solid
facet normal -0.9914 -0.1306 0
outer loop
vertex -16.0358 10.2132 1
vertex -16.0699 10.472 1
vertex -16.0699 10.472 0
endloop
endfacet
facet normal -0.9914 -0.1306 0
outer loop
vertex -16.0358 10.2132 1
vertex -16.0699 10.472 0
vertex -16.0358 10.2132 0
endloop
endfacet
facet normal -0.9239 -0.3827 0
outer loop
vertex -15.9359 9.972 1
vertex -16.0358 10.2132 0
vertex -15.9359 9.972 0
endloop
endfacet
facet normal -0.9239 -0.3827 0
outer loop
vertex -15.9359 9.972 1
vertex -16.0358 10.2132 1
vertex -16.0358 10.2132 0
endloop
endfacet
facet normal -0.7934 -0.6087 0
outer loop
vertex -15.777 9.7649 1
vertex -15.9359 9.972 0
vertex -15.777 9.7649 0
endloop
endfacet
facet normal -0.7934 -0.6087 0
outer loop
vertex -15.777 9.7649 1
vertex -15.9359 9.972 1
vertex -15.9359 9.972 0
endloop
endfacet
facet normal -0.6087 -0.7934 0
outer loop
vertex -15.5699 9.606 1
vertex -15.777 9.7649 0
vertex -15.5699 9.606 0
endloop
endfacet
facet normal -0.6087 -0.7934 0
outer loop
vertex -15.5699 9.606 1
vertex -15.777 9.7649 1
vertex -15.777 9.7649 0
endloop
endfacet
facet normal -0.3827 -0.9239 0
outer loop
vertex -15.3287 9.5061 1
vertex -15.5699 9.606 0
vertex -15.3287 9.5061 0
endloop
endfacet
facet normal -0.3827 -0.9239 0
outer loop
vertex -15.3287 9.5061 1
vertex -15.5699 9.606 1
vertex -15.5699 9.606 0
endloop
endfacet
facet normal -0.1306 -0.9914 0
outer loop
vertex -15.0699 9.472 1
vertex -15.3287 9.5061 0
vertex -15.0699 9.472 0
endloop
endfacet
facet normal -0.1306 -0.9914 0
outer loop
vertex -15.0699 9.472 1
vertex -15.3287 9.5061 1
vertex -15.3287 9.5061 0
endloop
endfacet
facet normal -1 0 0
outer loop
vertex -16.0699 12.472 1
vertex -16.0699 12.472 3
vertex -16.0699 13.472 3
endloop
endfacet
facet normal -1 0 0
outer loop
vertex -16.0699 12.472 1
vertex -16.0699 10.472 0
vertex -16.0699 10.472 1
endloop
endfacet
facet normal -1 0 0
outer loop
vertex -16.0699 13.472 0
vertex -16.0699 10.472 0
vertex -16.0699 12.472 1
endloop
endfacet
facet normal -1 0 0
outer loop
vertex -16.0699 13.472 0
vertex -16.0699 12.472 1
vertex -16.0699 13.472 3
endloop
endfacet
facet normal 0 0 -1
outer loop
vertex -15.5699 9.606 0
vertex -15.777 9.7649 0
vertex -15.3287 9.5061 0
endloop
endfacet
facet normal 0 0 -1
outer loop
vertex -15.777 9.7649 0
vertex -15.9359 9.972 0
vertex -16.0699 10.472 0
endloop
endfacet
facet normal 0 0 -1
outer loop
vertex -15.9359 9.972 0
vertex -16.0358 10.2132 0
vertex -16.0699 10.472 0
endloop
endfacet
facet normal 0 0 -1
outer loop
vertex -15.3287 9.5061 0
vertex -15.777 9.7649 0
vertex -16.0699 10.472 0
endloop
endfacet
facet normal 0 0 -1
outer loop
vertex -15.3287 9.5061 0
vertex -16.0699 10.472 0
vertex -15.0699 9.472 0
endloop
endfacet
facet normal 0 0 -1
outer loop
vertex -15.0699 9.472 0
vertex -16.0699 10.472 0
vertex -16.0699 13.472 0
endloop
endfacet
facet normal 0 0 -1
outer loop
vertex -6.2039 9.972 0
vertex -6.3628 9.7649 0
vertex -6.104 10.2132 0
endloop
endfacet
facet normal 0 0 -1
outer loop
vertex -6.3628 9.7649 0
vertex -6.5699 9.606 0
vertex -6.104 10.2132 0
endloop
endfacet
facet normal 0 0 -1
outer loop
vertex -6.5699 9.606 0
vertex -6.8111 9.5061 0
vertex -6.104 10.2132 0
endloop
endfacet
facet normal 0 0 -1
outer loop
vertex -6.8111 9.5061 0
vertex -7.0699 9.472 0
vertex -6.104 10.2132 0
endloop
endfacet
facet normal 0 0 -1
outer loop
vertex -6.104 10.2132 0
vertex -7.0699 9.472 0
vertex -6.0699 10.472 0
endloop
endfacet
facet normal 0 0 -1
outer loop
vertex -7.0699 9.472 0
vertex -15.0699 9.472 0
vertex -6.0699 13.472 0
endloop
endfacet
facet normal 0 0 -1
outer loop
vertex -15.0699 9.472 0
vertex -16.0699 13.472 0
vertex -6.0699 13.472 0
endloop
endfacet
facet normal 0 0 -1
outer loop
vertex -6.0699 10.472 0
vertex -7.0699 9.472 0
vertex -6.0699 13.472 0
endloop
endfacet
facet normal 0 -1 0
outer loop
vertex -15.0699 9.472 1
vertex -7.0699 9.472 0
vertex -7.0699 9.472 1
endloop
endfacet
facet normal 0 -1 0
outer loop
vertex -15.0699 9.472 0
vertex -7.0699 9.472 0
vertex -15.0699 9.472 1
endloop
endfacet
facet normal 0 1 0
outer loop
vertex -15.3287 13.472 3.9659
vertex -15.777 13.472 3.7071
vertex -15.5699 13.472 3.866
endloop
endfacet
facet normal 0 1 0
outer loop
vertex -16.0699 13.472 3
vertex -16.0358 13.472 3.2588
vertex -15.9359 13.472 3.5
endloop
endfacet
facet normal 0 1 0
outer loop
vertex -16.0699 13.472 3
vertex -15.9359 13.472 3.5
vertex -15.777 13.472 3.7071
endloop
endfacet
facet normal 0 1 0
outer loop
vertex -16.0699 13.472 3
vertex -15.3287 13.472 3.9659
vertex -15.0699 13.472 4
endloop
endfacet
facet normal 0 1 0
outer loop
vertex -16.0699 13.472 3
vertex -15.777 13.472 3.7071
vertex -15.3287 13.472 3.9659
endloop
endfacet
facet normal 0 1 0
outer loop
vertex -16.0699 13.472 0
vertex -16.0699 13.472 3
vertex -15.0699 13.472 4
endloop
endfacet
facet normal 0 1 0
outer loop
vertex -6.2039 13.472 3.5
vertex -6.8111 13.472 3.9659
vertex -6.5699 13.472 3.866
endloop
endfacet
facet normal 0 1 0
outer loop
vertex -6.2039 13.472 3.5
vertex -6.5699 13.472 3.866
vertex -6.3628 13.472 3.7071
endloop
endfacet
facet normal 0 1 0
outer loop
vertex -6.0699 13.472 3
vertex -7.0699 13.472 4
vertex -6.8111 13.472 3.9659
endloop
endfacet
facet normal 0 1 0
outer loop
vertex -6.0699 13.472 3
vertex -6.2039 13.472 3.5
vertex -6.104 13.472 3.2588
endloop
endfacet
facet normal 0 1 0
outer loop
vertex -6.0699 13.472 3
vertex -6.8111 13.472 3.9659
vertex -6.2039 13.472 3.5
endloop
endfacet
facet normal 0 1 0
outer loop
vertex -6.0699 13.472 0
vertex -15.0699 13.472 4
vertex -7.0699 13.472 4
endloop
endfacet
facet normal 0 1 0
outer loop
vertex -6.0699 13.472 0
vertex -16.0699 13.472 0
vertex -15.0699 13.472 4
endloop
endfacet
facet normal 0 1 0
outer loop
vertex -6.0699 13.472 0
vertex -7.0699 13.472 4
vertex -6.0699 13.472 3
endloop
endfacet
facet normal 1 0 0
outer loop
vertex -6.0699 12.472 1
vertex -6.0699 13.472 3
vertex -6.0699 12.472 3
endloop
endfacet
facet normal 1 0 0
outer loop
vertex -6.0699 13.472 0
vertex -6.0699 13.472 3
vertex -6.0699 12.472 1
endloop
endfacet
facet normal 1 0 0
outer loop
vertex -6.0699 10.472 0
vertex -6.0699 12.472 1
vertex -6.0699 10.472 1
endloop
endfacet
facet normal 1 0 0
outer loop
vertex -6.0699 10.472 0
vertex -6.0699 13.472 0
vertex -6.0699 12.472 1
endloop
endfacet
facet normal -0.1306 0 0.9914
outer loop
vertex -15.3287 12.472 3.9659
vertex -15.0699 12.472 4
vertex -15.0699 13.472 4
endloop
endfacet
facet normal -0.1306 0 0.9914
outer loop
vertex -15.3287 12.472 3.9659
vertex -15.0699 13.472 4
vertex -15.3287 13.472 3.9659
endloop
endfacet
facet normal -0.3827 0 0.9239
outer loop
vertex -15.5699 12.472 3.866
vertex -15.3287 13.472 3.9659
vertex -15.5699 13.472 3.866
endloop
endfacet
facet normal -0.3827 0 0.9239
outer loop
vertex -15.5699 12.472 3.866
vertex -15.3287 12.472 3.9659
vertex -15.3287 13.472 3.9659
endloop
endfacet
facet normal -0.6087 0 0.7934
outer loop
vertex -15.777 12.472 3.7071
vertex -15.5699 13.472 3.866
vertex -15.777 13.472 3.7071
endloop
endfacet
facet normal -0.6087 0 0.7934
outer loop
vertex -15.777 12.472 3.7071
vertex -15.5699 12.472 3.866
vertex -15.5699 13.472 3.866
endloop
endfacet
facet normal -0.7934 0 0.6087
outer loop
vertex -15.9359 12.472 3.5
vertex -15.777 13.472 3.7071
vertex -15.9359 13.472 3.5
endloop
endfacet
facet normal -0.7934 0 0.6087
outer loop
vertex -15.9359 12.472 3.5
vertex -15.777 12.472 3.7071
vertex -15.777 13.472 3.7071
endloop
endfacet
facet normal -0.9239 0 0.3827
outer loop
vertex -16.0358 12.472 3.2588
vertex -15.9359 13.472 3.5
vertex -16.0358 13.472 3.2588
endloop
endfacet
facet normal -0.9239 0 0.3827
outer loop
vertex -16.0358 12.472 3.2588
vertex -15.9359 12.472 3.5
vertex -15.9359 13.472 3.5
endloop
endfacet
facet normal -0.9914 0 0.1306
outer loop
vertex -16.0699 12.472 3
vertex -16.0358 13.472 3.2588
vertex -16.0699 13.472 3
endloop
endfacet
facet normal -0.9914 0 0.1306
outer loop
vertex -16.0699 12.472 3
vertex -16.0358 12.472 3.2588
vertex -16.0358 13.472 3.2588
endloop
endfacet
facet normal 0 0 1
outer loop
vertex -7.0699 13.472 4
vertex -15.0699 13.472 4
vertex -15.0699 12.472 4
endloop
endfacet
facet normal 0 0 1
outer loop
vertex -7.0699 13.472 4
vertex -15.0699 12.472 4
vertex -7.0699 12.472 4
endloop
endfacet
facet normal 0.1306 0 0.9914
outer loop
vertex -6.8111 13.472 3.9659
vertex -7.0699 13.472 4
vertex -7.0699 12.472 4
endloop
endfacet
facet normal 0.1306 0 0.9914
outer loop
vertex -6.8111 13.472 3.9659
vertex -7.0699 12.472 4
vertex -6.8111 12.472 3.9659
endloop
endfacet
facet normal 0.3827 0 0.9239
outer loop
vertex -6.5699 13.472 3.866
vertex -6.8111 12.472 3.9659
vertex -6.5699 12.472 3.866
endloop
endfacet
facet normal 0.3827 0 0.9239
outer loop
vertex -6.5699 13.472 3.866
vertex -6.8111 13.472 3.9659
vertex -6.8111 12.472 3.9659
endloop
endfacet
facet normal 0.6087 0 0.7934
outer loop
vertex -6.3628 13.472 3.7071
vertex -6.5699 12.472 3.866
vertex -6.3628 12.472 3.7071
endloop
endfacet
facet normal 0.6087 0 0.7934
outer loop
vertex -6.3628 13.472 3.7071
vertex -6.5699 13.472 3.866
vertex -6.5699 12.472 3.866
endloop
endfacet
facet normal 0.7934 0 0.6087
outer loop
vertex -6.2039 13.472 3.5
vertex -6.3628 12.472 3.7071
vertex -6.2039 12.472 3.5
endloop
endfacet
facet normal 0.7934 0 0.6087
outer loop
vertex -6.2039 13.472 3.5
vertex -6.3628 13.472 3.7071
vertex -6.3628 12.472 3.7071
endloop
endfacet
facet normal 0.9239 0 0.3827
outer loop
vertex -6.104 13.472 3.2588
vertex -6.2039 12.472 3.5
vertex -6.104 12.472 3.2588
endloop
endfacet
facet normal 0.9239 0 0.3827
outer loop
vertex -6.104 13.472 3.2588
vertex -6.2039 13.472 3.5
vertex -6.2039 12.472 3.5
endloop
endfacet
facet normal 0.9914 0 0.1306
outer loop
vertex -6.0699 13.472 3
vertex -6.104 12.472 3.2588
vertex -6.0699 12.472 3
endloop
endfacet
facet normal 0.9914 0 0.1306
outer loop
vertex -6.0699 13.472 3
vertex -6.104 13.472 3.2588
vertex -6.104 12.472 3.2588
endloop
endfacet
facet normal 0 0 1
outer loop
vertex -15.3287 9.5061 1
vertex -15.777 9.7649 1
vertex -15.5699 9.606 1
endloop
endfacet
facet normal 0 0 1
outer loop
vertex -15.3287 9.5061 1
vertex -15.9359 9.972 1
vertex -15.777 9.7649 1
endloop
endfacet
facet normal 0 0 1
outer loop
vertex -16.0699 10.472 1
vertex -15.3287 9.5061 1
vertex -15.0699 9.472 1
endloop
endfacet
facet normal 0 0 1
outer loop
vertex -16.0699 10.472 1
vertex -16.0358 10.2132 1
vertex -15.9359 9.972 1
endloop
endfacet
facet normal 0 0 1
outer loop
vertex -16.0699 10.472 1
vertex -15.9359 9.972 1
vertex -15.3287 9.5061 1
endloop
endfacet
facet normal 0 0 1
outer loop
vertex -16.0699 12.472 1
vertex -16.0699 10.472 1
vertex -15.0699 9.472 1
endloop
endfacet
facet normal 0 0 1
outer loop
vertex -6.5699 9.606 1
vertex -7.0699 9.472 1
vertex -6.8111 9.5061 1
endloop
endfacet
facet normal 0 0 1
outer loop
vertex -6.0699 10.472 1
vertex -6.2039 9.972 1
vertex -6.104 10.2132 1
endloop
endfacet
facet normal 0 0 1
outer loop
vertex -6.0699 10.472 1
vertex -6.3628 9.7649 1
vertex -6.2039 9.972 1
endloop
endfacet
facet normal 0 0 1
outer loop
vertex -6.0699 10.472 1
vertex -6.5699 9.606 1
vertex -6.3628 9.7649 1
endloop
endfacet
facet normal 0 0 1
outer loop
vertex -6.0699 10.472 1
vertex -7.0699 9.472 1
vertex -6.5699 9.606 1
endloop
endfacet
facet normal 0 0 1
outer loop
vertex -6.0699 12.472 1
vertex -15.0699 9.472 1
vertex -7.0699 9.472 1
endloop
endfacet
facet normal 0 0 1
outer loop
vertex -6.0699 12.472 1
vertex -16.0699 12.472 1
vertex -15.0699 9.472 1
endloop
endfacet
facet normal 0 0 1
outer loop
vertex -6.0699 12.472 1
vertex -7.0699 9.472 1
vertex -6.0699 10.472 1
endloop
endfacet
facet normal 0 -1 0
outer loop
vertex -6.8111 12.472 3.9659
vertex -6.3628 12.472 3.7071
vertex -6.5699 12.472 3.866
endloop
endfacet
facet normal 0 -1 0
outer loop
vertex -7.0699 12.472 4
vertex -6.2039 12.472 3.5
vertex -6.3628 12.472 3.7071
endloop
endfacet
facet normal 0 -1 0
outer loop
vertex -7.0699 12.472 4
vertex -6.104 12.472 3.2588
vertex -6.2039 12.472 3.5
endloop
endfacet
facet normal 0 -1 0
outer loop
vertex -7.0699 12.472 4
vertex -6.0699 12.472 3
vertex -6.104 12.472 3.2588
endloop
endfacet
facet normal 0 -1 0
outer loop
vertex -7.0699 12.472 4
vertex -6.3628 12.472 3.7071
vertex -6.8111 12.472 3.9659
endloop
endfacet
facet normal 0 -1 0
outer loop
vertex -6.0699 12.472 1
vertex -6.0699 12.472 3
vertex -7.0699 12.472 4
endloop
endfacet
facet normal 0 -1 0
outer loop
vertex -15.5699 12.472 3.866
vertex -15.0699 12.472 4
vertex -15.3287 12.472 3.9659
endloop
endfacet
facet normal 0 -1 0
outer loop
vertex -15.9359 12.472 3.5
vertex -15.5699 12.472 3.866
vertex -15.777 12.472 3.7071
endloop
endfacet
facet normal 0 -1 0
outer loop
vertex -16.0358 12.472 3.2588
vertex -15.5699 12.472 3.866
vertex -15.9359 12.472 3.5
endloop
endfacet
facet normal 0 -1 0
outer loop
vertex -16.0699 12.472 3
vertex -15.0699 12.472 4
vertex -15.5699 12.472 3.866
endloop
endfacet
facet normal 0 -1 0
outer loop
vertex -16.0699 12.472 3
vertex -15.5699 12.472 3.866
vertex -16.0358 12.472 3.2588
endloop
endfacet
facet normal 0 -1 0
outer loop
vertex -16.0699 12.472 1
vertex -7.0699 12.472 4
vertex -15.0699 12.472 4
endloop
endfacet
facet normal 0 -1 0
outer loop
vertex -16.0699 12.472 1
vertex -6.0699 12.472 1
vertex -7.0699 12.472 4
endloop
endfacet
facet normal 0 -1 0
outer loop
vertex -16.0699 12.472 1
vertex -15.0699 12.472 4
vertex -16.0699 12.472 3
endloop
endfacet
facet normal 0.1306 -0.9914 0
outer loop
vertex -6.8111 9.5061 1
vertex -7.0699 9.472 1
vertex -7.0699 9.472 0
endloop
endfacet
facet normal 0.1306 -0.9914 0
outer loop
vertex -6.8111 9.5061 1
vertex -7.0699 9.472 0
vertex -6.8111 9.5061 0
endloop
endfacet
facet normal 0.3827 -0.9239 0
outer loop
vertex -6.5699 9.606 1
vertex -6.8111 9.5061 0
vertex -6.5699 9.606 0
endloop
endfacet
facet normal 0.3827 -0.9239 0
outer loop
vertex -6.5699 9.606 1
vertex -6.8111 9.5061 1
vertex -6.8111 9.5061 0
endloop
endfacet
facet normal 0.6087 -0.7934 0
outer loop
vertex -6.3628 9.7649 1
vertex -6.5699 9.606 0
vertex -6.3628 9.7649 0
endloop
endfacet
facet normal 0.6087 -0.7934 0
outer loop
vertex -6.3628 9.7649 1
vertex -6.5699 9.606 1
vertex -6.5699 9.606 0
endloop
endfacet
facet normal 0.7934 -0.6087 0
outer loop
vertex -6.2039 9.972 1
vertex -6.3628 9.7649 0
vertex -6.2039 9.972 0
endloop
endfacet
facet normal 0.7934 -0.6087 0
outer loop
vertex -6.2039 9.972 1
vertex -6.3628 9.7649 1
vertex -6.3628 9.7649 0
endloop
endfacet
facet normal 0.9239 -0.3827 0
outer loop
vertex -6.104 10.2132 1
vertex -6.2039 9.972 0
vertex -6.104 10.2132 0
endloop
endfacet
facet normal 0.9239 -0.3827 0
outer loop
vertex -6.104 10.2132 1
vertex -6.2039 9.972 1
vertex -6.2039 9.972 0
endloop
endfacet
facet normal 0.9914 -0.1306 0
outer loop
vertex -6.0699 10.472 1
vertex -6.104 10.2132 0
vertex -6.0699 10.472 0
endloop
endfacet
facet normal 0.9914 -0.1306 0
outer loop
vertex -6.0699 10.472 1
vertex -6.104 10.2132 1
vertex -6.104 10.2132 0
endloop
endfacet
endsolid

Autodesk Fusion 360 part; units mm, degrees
sketch "Sketch1" plane through (0, 0, 0) normal (0, 0, 1) x (1, 0, 0)
  line L0 (-16.0699, 13.472) -> (-6.0699, 13.472)
  line L1 (-6.0699, 13.472) -> (-6.0699, 9.472)
  line L2 (-6.0699, 9.472) -> (-16.0699, 9.472)
  line L3 (-16.0699, 9.472) -> (-16.0699, 13.472)
  dimension "d1" = 10
  dimension "d2" = 4
extrude "Extrude1" add sketch "Sketch1" along normal blind 1
sketch "Sketch2" plane through (0, 0, 1) normal (0, 0, 1) x (1, 0, 0)
  line L0 (-16.0699, 9.472) -> (-6.0699, 9.472)
  line L1 (-6.0699, 9.472) -> (-6.0699, 13.472)
  line L2 (-6.0699, 13.472) -> (-16.0699, 13.472)
  line L3 (-16.0699, 13.472) -> (-16.0699, 9.472)
  line L4 (-16.0699, 13.472) -> (-6.0699, 13.472)
  line L5 (-6.0699, 13.472) -> (-6.0699, 12.472)
  line L6 (-6.0699, 12.472) -> (-16.0699, 12.472)
  line L7 (-16.0699, 12.472) -> (-16.0699, 13.472)
  dimension "d5" = 1
  dimension "d6" = 10
extrude "Extrude2" add sketch "Sketch2" along normal blind 3 contours L1 L2 L3 L4 L5 L6 L7
fillet "Fillet1" radius 1 1 edges at (-6.0699, 9.472, 0.5)
fillet "Fillet2" radius 1 1 edges at (-16.0699, 9.472, 0.5)
fillet "Fillet3" radius 1 1 edges at (-16.0699, 12.972, 4)
fillet "Fillet4" radius 1 1 edges at (-6.0699, 12.972, 4)
